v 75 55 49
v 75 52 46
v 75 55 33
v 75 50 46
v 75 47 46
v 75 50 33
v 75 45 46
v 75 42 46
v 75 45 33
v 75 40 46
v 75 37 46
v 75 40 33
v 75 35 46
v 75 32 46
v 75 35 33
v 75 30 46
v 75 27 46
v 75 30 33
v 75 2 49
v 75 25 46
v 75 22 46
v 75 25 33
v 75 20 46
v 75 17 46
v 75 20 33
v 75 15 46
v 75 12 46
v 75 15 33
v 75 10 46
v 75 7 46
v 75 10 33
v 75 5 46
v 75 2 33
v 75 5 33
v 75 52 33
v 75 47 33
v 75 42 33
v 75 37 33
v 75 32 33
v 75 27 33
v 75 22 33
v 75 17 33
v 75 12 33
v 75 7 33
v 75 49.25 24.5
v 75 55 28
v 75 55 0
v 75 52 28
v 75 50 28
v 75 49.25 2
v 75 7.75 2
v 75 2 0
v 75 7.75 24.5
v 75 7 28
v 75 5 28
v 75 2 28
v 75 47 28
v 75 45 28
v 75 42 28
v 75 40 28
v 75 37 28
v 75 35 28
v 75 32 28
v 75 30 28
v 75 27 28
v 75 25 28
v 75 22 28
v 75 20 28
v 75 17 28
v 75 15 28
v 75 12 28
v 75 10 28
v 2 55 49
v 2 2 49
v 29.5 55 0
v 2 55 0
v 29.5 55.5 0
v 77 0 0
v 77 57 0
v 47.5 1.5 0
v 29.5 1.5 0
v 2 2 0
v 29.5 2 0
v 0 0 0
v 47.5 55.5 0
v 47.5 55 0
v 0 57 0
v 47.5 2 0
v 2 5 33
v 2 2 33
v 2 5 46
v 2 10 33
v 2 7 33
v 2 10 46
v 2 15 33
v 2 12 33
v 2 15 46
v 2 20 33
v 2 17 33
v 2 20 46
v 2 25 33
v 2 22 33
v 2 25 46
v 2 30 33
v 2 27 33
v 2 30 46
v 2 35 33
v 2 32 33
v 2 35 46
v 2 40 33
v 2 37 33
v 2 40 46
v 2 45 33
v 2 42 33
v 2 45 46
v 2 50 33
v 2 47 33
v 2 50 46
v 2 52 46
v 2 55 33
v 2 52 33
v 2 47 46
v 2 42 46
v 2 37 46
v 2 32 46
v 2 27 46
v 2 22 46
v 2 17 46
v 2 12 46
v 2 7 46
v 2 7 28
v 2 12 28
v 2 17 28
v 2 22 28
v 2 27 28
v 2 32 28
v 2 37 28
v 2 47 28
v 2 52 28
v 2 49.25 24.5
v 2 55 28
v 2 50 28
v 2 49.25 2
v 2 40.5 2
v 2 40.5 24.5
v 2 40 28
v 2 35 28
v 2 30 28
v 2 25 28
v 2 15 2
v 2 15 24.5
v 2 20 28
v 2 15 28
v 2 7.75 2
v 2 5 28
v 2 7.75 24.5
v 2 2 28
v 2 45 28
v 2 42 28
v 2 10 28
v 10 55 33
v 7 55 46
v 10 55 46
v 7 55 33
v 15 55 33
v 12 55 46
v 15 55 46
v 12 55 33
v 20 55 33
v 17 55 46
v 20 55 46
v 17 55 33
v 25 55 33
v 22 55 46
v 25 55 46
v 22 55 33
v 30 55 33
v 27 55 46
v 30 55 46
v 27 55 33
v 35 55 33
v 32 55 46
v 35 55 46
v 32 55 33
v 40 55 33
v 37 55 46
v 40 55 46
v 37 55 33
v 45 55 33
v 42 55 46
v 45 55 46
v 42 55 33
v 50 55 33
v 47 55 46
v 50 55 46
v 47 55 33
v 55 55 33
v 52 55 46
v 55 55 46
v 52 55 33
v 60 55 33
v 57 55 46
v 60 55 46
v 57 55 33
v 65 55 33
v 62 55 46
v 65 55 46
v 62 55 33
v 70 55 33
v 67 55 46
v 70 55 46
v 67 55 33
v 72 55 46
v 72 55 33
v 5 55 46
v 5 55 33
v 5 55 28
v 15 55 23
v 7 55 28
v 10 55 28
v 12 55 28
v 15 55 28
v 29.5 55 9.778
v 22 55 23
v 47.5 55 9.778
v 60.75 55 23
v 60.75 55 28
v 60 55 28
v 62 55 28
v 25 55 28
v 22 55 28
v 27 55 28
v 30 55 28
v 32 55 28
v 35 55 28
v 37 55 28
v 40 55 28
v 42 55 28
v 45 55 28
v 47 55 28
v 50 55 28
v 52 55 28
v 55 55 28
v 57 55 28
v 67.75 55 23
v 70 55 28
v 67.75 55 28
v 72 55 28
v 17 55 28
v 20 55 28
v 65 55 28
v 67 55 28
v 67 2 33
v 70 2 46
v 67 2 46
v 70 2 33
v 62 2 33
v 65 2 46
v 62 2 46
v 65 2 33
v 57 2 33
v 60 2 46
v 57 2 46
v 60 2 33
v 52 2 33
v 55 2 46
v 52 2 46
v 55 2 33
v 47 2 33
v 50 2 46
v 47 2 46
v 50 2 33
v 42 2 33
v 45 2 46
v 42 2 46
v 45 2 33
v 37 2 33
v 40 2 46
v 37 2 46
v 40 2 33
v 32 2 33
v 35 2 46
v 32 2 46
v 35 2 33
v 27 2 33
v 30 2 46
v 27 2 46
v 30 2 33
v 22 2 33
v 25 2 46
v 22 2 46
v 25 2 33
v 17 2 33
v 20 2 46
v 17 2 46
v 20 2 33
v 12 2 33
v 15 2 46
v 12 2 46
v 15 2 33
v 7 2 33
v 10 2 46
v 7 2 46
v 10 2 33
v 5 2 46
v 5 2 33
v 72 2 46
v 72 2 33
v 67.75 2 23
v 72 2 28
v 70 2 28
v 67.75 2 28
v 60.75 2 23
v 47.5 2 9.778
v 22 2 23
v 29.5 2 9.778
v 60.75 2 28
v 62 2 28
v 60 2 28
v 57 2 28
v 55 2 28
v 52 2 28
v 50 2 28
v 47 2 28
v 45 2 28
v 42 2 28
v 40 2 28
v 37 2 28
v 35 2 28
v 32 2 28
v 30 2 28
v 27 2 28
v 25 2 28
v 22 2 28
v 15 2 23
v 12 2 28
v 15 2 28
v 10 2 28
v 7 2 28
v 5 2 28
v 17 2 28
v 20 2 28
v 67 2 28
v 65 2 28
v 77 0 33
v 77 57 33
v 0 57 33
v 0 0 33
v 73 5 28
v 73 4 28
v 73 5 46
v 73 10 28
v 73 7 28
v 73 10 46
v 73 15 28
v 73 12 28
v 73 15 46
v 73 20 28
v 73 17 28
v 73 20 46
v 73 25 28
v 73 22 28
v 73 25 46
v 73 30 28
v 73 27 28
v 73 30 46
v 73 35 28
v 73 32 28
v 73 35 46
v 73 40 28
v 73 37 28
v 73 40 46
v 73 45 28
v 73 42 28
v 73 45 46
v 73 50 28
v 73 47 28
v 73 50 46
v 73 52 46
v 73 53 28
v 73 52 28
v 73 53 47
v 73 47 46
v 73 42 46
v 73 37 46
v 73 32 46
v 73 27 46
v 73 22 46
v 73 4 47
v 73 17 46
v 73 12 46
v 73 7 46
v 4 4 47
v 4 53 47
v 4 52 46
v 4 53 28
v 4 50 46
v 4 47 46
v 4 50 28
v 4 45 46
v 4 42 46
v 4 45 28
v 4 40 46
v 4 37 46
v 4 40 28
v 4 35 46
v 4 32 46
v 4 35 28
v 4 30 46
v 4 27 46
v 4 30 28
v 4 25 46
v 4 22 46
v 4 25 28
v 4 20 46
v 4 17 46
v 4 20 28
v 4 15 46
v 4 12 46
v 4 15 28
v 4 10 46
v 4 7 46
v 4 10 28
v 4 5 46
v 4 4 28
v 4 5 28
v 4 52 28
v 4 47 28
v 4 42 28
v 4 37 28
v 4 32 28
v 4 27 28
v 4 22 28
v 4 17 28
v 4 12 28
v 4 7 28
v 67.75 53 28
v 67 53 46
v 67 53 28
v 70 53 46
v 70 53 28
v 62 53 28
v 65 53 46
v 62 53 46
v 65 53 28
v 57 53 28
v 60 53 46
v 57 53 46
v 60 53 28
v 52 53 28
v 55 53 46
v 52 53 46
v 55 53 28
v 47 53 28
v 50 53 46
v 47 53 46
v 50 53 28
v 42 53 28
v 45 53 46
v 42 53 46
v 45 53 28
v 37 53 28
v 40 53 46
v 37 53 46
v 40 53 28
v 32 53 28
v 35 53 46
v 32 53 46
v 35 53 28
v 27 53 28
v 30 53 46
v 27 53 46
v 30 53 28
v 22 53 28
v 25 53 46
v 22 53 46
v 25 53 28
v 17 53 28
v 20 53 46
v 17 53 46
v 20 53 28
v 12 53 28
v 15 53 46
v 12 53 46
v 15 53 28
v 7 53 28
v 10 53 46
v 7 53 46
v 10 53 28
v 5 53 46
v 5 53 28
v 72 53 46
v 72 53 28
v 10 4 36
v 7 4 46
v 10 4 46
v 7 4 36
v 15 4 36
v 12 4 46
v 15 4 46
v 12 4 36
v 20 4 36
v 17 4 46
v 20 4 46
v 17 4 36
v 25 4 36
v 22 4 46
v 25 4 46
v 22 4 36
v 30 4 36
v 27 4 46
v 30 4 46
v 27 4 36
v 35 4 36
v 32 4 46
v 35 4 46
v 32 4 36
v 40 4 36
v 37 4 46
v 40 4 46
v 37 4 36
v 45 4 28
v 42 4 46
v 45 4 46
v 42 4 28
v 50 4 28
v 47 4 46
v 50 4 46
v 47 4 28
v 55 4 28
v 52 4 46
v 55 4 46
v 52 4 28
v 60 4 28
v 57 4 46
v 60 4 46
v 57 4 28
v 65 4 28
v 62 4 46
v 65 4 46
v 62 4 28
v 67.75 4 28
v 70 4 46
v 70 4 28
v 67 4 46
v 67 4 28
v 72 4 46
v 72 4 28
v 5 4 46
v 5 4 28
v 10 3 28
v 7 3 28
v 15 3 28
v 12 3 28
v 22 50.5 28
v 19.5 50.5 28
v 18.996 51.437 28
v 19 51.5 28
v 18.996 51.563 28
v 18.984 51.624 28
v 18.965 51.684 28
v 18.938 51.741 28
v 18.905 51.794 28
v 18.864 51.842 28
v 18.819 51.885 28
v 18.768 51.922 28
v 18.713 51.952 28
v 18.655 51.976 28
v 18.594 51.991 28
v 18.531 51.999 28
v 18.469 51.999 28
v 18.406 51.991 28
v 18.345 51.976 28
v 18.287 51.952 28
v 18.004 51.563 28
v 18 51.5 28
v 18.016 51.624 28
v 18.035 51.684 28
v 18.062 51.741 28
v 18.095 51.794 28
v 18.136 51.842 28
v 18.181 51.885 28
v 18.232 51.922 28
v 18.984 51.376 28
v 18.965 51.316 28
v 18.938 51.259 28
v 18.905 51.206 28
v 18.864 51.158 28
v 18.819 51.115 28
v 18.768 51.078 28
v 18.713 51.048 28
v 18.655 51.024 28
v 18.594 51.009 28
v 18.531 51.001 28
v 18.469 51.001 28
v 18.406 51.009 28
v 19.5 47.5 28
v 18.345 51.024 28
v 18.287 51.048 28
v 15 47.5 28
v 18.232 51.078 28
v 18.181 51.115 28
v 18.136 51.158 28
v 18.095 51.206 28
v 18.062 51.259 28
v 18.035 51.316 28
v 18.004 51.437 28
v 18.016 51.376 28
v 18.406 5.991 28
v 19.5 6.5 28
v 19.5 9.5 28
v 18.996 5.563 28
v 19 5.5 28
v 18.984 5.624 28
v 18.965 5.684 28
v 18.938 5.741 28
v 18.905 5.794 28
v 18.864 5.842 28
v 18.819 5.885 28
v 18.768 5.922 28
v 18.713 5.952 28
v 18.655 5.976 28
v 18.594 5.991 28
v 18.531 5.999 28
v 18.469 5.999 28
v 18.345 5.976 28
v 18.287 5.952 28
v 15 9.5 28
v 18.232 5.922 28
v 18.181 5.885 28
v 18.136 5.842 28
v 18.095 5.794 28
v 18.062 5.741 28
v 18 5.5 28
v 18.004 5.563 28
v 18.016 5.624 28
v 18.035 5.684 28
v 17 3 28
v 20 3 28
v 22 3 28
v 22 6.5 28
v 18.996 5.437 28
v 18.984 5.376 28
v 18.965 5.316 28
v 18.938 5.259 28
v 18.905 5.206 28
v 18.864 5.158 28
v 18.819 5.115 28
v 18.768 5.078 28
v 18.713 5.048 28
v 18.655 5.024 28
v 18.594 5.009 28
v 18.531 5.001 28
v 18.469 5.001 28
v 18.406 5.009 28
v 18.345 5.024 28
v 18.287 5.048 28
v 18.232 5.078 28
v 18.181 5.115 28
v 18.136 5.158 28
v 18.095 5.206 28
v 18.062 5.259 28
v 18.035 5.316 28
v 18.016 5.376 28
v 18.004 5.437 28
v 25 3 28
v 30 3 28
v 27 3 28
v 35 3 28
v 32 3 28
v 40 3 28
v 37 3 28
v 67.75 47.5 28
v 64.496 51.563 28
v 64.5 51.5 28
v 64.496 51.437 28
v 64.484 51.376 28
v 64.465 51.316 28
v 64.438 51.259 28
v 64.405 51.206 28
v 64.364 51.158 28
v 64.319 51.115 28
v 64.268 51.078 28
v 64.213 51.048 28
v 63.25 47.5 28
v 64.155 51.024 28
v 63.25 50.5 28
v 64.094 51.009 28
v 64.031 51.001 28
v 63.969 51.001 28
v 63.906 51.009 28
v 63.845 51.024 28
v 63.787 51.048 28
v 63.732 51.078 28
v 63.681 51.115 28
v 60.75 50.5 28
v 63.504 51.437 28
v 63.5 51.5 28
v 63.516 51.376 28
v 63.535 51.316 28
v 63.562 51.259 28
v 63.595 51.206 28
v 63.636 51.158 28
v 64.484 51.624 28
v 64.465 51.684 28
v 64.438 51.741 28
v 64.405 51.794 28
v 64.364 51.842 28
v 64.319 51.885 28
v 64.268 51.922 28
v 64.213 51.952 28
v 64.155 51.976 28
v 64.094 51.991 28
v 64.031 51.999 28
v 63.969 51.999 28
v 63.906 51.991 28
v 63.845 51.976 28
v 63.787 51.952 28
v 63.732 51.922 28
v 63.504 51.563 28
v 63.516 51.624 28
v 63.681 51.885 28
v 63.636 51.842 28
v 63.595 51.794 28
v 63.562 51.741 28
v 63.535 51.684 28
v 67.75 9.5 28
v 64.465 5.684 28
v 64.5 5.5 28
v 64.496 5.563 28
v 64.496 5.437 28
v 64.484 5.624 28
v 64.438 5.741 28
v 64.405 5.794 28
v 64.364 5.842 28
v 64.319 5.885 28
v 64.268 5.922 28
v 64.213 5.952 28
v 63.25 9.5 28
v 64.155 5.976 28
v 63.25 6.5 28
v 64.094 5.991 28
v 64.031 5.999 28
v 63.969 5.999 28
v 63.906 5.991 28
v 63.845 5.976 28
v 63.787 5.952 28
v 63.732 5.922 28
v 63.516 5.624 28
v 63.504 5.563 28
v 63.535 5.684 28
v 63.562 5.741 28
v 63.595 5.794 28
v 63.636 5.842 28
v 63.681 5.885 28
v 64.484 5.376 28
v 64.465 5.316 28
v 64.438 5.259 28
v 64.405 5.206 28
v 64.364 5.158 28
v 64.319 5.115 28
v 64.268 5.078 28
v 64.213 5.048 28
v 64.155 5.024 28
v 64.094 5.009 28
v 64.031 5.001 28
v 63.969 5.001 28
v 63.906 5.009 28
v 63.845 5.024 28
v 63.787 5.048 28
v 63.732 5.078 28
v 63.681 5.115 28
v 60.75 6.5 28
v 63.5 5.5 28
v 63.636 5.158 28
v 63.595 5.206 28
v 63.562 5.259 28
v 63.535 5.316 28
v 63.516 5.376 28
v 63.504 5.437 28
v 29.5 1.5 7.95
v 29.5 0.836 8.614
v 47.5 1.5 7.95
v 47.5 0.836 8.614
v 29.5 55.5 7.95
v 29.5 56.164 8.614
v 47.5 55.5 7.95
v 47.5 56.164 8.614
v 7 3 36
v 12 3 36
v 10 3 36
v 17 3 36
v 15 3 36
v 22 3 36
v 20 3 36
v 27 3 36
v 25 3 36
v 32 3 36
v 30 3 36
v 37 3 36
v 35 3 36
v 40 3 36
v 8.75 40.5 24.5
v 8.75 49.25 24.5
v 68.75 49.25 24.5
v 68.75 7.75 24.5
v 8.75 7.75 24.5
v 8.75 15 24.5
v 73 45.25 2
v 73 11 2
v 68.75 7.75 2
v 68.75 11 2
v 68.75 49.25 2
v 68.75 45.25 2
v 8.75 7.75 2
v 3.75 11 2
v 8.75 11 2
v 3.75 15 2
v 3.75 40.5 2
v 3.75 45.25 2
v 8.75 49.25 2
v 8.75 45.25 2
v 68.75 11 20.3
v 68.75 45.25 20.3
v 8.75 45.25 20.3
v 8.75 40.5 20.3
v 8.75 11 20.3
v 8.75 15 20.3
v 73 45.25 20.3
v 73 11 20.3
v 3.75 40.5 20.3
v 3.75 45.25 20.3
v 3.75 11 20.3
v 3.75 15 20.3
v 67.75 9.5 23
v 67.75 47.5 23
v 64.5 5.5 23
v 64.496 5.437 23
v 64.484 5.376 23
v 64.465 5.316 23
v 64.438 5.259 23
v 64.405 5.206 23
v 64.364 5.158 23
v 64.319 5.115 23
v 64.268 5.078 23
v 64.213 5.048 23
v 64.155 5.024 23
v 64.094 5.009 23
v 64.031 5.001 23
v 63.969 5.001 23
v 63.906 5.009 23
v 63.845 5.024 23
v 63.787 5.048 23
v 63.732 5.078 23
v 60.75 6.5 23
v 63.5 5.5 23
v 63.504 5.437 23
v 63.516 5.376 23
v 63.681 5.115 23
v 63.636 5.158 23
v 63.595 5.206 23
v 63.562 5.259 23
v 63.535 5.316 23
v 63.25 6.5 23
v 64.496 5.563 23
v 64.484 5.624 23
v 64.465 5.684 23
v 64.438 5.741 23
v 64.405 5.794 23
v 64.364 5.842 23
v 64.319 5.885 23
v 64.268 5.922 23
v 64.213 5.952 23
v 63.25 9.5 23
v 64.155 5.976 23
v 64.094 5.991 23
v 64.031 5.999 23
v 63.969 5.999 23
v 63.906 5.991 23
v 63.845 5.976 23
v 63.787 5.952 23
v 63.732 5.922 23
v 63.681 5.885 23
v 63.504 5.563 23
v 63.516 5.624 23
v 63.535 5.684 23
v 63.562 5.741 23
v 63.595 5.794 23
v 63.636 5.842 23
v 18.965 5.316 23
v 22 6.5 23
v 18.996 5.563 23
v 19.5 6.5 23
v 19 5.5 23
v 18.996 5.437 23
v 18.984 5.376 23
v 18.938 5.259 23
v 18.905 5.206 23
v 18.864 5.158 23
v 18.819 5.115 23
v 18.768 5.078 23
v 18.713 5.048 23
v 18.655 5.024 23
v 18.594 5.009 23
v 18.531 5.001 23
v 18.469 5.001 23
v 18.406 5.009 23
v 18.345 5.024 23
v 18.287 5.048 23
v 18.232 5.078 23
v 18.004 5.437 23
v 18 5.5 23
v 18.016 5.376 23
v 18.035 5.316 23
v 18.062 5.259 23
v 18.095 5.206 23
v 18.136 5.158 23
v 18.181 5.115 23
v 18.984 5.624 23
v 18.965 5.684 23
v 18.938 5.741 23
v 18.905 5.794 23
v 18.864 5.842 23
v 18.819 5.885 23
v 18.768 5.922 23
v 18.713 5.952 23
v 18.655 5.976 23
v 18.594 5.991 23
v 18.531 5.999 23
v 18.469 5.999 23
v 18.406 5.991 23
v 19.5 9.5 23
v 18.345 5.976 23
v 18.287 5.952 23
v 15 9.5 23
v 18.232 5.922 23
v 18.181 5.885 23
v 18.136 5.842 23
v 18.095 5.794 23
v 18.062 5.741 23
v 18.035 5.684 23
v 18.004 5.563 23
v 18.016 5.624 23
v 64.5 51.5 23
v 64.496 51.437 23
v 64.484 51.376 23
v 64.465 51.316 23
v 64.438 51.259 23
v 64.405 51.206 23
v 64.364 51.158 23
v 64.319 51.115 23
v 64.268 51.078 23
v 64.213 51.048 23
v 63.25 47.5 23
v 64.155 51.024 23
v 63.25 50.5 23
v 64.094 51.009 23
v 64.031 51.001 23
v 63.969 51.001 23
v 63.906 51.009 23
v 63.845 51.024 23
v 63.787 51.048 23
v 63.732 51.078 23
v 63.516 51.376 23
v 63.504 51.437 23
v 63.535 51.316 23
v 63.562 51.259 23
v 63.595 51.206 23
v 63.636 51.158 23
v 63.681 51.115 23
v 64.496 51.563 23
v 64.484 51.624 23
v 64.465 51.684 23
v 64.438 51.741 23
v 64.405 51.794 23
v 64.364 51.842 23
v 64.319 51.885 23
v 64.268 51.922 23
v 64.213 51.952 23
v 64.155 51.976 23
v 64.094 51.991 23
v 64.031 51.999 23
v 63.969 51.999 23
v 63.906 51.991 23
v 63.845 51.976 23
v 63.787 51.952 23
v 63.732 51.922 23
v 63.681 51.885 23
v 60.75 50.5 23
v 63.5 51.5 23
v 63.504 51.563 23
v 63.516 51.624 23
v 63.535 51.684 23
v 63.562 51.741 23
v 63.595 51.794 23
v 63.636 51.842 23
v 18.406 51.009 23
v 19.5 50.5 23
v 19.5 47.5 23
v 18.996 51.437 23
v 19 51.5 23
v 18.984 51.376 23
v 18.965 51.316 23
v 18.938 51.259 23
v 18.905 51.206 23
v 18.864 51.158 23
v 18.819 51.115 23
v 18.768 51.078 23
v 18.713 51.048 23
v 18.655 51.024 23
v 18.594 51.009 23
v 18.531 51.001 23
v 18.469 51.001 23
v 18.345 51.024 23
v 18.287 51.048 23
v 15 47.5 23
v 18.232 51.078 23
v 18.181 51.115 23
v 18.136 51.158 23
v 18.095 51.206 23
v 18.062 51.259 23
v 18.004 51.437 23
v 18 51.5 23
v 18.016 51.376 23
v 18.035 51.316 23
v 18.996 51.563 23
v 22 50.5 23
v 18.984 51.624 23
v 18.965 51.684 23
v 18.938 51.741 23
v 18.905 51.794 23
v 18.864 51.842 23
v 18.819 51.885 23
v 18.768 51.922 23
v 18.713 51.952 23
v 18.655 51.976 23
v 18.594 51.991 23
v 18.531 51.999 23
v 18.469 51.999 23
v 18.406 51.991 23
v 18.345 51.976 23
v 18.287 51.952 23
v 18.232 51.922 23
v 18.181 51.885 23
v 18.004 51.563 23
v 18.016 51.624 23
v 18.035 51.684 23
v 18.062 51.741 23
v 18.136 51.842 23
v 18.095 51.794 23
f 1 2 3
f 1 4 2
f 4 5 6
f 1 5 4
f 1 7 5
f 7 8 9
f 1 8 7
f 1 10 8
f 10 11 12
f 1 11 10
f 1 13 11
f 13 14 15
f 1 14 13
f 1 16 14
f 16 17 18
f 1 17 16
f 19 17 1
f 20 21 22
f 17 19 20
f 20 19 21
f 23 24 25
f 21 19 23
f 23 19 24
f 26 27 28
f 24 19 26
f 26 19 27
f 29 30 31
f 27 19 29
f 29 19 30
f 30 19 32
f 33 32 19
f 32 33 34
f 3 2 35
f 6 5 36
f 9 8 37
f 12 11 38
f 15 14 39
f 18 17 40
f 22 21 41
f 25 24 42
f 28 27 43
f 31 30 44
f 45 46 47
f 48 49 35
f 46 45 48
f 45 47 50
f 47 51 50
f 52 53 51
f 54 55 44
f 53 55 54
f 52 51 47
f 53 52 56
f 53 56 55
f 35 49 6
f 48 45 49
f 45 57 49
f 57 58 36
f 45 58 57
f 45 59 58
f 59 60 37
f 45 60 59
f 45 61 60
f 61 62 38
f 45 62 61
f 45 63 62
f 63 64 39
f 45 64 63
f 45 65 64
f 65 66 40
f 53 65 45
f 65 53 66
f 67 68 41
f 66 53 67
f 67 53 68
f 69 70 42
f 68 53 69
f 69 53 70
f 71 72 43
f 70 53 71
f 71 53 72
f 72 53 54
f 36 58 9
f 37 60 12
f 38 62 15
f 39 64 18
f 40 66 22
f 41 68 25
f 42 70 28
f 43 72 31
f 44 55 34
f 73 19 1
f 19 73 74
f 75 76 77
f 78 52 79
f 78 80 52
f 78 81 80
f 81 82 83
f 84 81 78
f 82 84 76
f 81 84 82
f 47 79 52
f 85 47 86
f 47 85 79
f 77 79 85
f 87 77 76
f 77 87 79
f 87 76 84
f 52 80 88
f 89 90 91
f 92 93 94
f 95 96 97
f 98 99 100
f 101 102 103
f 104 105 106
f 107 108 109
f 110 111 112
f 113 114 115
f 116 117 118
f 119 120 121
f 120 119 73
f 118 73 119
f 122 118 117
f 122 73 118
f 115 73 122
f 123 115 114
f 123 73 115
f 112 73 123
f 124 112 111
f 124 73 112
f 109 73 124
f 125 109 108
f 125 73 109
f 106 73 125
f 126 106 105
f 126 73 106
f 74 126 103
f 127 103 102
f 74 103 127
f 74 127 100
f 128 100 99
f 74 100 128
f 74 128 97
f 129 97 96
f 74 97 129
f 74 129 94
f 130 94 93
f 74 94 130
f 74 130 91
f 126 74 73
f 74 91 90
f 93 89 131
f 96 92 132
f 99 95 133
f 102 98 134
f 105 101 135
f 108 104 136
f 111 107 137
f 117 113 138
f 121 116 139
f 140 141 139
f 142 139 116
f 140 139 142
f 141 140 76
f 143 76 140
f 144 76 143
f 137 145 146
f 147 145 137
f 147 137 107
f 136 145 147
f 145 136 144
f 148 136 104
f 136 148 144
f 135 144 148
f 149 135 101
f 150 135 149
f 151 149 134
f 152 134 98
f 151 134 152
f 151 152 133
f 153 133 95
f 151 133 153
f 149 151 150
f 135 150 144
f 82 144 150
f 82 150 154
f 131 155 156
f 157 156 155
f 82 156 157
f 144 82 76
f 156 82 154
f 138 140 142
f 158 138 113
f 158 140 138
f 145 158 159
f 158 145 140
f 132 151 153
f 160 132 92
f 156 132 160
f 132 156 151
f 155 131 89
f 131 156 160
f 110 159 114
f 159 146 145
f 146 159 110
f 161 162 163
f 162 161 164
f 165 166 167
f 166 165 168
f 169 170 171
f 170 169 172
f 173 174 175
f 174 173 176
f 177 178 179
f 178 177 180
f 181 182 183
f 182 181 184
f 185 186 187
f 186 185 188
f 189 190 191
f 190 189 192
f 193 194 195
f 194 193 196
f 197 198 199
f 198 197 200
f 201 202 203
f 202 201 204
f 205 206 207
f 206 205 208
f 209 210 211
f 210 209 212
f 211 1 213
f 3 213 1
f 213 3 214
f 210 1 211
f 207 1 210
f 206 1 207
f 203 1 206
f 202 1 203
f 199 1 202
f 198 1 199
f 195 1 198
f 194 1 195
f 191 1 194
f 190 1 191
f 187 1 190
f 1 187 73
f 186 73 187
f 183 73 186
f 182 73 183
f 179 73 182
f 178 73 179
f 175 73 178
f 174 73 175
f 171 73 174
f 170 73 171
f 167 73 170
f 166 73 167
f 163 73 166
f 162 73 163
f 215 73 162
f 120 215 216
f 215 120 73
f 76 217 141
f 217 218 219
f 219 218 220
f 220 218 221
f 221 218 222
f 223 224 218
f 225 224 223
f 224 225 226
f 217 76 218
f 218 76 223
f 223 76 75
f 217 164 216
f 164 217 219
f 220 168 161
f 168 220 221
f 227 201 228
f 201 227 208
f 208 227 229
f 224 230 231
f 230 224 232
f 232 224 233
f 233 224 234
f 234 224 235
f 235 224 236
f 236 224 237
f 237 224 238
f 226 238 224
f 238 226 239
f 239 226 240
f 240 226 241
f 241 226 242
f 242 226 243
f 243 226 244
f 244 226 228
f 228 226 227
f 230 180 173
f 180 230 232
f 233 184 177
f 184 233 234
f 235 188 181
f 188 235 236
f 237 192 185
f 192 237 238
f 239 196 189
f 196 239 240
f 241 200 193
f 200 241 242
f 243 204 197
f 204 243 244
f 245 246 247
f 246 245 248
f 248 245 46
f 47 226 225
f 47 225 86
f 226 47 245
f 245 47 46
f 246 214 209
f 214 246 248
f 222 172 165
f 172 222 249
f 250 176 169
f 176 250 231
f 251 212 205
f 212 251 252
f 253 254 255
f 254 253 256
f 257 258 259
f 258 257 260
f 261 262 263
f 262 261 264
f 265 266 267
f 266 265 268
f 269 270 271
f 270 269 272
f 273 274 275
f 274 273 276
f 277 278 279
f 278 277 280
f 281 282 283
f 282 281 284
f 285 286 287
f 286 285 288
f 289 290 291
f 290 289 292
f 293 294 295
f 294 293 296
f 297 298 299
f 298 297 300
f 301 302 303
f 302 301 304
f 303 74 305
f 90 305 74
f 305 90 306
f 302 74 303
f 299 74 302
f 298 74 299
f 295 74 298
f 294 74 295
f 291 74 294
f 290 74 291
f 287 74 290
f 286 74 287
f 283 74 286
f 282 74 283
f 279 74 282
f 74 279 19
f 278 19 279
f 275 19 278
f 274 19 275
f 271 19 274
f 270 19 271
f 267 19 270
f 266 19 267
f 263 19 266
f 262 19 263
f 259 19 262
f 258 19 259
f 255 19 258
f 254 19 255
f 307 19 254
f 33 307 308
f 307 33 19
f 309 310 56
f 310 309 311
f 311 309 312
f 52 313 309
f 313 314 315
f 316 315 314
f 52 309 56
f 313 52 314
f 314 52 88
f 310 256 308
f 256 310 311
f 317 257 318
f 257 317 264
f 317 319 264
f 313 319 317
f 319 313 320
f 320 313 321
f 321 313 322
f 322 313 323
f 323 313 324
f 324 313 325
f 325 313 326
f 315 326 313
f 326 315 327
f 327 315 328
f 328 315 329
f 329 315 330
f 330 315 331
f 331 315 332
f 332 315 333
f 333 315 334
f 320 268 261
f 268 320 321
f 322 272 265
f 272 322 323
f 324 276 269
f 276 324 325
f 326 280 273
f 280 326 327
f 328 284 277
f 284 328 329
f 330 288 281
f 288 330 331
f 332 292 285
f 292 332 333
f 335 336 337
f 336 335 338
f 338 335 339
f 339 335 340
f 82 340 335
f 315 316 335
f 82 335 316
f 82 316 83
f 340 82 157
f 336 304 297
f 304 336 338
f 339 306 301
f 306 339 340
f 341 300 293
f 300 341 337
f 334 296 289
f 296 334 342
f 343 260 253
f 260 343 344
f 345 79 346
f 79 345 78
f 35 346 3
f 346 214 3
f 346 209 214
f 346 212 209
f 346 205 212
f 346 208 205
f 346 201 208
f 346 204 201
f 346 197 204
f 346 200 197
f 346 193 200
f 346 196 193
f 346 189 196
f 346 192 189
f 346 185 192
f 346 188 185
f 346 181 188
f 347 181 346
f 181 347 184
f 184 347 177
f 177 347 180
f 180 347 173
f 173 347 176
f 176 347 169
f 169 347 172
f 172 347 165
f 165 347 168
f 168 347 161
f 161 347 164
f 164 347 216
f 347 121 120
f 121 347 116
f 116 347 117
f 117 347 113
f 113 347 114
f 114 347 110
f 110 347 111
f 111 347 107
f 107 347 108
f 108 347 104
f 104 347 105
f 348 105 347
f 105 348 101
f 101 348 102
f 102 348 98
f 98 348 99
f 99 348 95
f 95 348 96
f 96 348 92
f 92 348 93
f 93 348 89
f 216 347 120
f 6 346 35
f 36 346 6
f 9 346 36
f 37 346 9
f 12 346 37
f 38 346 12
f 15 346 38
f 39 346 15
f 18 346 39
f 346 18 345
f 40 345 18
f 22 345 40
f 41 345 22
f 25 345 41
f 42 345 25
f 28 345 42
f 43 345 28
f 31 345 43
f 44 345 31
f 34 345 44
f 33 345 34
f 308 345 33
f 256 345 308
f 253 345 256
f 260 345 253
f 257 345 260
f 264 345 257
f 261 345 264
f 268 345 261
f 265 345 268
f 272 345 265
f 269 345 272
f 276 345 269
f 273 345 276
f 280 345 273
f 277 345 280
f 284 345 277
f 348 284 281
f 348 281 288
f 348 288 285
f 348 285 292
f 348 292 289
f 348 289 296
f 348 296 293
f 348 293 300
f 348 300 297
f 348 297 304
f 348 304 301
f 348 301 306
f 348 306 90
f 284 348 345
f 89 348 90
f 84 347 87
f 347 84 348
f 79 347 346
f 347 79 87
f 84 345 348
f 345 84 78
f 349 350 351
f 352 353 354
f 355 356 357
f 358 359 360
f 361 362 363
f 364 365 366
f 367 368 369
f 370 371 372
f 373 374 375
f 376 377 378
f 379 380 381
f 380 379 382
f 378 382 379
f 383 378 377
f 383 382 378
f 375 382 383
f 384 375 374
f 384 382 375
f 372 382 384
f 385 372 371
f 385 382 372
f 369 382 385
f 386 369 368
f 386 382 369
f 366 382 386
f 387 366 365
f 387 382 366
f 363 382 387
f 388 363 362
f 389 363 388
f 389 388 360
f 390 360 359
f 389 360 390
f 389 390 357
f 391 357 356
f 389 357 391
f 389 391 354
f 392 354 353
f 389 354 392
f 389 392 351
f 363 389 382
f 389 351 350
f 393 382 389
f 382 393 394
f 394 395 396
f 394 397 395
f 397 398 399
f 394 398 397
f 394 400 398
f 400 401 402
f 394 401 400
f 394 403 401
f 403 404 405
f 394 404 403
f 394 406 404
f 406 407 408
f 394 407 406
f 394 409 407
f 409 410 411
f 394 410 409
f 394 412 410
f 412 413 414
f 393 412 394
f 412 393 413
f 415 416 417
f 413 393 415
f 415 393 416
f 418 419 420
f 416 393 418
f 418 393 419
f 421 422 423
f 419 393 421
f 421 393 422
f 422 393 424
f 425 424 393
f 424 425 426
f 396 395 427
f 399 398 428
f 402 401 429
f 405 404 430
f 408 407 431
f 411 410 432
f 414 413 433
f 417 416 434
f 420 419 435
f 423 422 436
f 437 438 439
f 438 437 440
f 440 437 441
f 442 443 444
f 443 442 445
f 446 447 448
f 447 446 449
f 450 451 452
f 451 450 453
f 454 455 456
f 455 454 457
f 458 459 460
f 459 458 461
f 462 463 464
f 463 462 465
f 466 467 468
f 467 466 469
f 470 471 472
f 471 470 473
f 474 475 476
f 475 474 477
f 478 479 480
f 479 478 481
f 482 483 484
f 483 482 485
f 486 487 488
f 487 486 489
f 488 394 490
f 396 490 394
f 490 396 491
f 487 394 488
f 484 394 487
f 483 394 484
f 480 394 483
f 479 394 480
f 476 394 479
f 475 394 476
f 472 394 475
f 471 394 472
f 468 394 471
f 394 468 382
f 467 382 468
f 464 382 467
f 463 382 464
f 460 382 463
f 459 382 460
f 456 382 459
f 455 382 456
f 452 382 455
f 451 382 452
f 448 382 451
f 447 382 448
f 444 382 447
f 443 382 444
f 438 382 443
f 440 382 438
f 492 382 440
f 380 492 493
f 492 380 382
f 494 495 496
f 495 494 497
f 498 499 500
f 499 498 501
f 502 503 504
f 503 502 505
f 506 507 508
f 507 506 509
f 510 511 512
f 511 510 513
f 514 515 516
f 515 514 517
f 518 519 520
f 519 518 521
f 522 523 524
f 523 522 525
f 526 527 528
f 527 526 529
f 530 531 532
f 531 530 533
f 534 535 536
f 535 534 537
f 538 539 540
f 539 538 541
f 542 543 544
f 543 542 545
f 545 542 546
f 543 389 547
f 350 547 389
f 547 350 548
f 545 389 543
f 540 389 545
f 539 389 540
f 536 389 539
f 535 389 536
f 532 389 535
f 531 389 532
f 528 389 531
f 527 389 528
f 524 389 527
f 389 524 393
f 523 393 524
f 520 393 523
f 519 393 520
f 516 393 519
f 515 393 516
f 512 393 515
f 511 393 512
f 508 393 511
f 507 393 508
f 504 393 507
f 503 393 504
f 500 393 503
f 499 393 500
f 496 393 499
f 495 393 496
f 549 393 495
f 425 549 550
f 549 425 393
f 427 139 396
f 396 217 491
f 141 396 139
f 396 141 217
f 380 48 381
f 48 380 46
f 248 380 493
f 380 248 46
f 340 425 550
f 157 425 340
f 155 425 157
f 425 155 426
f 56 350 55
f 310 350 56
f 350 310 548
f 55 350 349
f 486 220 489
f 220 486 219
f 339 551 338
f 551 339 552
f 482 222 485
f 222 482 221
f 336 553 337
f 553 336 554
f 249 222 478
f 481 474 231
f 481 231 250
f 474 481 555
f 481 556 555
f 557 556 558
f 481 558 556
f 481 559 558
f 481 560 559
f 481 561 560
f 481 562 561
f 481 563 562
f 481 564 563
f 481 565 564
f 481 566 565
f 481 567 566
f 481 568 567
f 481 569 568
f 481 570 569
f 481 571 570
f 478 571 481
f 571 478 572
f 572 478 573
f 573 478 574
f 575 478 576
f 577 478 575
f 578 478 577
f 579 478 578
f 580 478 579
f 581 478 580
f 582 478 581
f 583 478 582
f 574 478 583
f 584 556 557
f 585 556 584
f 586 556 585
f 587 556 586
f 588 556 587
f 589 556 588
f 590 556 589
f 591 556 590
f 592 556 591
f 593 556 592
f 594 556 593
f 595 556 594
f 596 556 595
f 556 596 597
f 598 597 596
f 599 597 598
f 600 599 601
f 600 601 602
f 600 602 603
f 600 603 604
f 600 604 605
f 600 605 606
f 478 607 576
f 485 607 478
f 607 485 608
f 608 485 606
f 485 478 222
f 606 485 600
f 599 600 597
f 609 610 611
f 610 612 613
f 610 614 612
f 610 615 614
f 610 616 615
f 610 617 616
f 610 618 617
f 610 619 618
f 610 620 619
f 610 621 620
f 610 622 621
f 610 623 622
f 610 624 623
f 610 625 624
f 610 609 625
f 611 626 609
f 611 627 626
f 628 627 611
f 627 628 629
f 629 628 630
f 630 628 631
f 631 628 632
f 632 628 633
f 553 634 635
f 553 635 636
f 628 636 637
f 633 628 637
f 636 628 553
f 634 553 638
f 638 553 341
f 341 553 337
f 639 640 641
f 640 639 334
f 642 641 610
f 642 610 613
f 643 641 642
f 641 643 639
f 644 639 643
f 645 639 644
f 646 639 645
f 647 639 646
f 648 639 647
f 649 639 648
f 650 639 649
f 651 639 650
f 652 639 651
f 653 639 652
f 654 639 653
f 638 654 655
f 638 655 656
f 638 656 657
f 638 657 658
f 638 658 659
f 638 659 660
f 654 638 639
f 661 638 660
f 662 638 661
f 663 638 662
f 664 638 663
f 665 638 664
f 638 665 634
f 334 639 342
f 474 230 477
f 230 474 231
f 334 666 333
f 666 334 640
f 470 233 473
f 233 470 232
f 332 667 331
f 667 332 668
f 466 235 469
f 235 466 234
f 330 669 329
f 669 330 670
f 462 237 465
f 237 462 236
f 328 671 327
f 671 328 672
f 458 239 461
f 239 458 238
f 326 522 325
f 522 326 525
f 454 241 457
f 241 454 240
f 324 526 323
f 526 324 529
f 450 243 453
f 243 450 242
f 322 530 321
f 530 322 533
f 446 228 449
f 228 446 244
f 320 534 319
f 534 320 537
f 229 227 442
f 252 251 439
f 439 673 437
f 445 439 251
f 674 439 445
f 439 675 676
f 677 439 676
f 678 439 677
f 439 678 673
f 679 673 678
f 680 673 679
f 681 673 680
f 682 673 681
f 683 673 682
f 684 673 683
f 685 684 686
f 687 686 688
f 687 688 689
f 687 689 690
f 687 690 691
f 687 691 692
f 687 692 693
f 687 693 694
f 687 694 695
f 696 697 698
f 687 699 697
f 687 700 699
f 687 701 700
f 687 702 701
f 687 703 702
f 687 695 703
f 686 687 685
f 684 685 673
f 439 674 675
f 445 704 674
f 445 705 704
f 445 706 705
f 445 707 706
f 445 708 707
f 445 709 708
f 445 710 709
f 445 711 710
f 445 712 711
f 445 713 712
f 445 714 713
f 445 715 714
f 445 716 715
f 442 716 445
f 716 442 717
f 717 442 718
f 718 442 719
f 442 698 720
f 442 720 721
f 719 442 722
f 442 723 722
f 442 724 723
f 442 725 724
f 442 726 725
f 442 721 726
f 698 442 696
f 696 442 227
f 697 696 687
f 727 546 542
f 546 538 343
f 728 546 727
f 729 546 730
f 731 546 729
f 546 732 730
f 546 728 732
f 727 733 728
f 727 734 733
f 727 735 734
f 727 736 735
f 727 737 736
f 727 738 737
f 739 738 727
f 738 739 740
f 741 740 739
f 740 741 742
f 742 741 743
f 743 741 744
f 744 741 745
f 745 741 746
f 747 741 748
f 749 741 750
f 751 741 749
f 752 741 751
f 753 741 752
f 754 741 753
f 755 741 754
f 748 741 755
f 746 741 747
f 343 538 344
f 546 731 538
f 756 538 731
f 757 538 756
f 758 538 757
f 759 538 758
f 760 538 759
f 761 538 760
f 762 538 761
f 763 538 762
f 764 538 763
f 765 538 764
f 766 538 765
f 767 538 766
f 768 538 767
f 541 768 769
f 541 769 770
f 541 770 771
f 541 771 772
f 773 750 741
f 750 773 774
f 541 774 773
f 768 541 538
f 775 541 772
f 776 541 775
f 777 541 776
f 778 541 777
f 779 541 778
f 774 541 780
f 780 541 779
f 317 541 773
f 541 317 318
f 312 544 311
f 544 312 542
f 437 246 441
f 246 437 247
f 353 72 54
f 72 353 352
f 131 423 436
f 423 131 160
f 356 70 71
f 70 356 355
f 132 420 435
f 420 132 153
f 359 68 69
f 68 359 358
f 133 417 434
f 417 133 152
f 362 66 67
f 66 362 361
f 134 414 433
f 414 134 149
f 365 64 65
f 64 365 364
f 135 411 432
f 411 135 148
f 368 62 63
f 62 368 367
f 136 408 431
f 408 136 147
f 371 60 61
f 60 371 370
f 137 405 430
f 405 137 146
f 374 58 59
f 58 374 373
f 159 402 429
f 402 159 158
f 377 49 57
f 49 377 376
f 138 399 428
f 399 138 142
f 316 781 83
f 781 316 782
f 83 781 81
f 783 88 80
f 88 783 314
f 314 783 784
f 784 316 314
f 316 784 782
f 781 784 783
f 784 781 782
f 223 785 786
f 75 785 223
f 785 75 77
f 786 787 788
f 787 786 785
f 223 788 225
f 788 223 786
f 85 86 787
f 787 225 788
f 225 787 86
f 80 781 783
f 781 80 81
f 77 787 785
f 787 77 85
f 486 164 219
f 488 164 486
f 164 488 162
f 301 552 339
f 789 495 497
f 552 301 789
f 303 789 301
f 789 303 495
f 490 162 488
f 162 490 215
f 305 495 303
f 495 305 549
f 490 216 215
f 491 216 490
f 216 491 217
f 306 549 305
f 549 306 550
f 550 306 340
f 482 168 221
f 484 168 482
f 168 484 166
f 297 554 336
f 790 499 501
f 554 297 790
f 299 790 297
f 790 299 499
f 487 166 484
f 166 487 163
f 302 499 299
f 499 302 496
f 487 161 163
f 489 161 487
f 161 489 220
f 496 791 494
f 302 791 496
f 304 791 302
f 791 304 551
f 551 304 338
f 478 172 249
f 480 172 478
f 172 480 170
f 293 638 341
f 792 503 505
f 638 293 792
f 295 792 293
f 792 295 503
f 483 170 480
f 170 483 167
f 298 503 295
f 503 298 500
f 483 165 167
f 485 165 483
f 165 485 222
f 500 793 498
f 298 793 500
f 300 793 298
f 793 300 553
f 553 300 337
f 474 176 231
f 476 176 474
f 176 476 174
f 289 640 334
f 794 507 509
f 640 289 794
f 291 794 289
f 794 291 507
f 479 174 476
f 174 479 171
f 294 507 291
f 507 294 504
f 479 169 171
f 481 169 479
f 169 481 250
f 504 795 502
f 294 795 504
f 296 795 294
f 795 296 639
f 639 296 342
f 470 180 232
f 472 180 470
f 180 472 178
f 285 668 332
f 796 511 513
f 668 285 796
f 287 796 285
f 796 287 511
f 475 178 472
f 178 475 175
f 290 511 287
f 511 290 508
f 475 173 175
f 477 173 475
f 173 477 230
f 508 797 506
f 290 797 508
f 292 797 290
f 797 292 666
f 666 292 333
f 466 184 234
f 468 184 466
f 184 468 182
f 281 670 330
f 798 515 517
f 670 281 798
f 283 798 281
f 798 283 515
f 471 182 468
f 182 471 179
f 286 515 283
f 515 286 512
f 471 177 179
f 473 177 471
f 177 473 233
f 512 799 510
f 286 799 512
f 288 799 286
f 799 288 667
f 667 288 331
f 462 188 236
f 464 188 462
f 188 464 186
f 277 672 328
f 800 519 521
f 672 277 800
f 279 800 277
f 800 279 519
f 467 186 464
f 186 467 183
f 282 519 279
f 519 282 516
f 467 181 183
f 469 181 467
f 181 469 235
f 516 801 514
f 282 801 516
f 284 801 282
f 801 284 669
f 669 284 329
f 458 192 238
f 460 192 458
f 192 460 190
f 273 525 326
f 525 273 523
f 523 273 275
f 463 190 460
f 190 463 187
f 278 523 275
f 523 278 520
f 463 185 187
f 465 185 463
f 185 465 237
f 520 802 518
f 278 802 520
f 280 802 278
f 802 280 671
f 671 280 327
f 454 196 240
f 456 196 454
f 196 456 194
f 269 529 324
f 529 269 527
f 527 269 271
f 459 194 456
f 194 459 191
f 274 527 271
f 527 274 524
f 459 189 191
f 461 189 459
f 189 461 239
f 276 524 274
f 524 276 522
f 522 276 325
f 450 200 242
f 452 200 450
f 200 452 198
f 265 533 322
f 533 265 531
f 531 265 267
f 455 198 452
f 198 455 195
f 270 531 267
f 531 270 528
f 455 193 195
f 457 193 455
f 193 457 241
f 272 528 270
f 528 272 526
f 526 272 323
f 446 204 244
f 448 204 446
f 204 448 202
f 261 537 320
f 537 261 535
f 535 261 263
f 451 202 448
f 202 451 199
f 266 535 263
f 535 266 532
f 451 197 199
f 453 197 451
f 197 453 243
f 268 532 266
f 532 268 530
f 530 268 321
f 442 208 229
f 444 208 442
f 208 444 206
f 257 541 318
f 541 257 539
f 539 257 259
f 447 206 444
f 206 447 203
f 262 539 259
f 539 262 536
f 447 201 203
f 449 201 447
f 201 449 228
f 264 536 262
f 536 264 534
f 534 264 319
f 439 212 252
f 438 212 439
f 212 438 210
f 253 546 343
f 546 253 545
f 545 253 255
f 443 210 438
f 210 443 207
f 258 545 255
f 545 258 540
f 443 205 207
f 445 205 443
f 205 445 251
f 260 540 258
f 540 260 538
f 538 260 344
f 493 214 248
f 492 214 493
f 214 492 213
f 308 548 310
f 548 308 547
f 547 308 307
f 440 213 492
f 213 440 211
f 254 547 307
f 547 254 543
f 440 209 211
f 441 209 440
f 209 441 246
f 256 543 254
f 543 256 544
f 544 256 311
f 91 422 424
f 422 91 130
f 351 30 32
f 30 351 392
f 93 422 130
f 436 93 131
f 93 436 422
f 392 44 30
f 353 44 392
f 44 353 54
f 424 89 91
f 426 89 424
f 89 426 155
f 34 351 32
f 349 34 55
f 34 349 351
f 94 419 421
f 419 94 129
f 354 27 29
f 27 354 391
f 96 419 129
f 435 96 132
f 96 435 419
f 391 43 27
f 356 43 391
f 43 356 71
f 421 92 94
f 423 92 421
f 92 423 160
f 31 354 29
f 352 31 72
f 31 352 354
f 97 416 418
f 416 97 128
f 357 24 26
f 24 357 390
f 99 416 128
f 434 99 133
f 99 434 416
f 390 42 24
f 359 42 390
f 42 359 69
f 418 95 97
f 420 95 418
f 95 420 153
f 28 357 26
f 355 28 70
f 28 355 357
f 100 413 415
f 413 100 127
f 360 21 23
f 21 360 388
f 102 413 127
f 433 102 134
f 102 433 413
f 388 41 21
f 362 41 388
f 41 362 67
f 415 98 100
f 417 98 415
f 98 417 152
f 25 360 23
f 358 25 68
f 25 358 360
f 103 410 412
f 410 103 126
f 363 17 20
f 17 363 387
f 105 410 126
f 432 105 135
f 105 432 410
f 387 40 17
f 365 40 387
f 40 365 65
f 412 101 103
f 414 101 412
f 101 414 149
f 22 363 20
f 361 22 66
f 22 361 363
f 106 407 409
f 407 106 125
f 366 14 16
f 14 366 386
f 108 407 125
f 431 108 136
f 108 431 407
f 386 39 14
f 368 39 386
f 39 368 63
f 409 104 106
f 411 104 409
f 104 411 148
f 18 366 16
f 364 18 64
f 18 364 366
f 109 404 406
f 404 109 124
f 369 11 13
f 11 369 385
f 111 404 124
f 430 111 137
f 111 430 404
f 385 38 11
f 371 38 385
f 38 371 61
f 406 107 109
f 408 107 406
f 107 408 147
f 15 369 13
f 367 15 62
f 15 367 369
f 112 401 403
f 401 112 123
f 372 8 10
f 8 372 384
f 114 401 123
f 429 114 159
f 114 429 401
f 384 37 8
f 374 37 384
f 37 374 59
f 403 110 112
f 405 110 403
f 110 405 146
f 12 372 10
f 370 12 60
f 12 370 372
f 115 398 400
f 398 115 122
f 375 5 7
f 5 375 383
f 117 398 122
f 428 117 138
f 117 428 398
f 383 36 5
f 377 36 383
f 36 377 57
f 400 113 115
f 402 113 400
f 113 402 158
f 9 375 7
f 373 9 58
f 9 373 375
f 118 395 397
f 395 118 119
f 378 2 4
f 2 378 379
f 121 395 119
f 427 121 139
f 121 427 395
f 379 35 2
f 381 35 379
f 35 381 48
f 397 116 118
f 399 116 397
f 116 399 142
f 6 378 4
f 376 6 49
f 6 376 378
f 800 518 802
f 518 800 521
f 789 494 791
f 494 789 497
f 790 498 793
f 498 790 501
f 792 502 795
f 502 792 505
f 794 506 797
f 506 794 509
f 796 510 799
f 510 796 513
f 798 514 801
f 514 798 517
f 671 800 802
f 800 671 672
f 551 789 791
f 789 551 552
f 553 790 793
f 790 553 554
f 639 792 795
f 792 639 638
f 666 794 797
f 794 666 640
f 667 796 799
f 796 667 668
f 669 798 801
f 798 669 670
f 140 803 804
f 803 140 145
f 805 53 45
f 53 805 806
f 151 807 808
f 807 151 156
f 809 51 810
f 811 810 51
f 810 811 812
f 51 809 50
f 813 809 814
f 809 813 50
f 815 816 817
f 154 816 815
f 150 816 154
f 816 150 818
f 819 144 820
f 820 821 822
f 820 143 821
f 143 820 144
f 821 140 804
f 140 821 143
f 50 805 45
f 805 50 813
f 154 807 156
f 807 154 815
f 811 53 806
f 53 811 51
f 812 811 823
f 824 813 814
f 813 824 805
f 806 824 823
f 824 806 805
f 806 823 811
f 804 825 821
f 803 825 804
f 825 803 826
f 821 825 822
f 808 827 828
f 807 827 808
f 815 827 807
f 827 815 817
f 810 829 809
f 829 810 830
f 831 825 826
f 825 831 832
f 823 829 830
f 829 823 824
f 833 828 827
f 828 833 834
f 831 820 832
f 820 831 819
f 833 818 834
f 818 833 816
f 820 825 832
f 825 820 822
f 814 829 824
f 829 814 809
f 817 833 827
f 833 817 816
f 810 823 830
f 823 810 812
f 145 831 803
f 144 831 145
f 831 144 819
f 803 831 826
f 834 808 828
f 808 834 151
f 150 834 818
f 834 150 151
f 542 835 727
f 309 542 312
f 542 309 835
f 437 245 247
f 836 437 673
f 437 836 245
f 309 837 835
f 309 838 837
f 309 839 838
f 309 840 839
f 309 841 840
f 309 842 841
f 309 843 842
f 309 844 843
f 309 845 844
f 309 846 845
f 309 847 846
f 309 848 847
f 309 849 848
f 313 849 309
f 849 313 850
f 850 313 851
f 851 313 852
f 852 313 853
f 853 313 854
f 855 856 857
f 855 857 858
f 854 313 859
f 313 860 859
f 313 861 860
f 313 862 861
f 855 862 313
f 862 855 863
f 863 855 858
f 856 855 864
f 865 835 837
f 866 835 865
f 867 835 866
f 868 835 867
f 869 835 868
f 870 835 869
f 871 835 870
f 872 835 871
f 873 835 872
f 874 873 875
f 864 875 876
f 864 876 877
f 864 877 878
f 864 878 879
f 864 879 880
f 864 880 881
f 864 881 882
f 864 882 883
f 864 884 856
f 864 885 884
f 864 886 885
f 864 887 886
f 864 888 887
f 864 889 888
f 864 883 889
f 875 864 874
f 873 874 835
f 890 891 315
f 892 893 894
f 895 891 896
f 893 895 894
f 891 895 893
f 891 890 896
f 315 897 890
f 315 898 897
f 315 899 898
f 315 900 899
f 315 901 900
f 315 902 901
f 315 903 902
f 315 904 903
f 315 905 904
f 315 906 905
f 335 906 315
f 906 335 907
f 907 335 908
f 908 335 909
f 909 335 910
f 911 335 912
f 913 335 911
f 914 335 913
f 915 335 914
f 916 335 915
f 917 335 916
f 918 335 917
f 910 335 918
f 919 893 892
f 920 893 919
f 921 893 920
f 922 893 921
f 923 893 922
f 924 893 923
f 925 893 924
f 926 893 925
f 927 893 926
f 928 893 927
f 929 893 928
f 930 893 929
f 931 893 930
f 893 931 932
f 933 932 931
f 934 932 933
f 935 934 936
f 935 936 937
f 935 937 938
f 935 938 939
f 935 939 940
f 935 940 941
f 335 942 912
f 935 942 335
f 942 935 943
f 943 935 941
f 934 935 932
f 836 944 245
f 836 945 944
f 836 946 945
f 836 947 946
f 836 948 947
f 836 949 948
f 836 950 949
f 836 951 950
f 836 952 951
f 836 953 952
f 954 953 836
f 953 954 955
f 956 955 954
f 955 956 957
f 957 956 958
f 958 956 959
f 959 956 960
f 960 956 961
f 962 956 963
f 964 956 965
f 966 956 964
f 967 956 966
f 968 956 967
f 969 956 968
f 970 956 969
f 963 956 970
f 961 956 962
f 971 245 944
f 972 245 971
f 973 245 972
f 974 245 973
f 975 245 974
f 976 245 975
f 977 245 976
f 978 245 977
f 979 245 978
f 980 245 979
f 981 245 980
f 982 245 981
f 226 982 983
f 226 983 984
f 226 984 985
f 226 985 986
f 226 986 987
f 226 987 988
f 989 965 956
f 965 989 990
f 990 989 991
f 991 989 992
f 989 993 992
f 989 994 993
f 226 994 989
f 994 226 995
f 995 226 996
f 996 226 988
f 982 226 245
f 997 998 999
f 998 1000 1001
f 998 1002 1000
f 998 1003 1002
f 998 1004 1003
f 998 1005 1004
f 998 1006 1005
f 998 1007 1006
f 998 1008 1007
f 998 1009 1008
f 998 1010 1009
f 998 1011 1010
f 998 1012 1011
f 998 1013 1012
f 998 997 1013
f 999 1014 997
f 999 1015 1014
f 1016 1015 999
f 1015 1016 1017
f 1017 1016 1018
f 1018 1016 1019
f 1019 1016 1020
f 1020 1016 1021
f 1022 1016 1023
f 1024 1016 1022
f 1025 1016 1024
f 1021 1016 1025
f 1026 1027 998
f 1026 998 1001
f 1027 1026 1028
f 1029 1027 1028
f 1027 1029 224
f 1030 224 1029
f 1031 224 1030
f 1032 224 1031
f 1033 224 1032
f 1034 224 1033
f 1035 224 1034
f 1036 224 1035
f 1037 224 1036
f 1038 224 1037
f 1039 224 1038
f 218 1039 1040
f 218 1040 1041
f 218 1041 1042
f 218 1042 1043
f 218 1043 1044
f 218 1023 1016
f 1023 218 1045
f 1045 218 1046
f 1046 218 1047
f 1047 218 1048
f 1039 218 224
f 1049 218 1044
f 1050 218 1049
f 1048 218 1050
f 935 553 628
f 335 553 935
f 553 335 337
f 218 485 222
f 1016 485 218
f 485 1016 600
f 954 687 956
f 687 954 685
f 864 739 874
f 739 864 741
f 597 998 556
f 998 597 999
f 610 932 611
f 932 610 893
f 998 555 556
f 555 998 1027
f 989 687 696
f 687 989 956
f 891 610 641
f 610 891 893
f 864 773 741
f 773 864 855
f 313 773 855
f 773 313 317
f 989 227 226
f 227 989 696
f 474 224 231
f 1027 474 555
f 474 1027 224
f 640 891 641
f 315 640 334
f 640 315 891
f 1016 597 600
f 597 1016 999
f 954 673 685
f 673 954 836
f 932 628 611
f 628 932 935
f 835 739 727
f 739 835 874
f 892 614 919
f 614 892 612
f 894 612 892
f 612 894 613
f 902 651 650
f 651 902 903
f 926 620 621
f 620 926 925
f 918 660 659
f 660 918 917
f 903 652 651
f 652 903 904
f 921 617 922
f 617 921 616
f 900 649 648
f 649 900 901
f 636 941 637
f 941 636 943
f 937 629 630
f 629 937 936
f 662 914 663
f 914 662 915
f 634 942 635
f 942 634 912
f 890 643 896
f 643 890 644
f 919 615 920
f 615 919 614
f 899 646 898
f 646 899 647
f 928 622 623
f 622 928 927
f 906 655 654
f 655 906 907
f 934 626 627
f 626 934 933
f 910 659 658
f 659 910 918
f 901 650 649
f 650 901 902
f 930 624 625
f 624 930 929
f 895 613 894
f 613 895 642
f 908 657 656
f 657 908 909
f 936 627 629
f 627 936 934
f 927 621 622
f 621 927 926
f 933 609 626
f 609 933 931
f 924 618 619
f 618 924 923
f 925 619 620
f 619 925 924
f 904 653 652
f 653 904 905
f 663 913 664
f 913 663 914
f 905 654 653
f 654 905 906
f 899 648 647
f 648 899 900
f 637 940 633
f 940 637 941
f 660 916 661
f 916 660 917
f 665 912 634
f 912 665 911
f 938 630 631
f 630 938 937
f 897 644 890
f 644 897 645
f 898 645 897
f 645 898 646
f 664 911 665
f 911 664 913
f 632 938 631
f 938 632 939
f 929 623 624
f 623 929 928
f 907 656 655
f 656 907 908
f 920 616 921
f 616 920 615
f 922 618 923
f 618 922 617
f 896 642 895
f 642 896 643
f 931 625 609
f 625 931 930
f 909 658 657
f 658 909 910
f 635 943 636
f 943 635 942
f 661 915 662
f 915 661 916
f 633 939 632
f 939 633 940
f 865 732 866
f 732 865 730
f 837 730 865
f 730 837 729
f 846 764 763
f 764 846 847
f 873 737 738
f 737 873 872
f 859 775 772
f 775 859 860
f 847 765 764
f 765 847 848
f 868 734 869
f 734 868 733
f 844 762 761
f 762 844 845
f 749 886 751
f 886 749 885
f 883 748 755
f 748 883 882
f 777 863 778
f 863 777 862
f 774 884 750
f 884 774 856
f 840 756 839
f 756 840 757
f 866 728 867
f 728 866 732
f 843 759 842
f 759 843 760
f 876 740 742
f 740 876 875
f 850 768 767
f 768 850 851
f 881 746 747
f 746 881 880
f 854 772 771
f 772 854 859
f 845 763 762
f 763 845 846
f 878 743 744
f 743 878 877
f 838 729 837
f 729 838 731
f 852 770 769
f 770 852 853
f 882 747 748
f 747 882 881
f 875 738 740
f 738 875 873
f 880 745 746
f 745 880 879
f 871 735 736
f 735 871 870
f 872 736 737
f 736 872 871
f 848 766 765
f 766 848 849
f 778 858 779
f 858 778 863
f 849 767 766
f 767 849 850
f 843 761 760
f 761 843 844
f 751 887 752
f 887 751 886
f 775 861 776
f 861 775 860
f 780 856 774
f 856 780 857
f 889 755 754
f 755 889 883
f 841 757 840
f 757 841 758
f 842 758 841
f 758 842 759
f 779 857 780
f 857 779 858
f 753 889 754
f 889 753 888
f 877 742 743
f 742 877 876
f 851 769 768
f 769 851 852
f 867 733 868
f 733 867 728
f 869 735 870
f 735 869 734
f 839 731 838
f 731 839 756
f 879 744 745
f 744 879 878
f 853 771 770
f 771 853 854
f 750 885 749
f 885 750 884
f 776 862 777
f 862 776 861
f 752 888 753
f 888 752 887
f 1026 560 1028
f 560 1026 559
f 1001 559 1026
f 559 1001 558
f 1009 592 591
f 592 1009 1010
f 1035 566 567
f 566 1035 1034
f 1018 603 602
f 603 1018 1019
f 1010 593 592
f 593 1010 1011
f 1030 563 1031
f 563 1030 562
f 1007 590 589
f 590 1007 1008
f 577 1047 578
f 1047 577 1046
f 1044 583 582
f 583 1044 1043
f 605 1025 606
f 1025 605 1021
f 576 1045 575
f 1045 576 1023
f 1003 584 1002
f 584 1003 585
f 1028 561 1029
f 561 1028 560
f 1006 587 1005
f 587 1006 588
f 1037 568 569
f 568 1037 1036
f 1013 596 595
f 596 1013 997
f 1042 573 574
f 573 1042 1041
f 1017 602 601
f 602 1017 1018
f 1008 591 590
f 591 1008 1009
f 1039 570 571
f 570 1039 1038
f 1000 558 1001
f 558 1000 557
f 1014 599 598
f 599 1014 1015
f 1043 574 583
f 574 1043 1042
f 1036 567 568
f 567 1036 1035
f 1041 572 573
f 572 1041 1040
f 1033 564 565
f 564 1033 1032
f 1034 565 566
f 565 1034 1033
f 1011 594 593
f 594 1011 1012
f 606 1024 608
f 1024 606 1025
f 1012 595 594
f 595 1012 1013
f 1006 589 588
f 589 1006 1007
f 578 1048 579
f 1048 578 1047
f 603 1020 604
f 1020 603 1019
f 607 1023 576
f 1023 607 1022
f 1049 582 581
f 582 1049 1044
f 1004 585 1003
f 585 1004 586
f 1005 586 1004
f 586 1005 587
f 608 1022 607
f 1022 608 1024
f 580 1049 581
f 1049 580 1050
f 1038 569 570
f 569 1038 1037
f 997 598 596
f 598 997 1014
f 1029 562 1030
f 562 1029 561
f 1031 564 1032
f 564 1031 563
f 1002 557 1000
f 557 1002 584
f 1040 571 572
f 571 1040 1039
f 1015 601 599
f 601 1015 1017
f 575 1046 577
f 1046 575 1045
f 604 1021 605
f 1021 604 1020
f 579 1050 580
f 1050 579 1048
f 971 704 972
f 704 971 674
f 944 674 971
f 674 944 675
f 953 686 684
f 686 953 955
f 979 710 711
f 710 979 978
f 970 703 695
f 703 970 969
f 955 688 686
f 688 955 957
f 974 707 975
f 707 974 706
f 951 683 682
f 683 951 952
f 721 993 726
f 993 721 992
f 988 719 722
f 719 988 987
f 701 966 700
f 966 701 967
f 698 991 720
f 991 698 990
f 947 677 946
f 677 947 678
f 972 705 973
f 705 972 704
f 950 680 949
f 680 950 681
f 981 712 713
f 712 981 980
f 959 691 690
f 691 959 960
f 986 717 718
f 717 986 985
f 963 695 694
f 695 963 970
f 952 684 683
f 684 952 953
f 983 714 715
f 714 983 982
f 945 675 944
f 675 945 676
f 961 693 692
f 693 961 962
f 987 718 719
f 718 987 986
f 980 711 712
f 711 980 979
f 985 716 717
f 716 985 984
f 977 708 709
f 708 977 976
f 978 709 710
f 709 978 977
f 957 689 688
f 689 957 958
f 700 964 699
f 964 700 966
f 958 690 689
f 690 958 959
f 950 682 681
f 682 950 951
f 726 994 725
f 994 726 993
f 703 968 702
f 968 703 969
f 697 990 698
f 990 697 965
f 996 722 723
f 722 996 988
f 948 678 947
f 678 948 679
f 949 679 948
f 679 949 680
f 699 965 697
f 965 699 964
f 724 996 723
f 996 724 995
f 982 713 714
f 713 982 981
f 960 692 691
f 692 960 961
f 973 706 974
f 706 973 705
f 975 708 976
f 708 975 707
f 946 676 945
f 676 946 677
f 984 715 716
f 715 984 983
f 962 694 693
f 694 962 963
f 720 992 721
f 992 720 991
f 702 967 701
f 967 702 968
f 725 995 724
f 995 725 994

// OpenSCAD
//Humidity sensor project box

$fn = 50;

/* Comment or uncomment the following lines to see each piece on its own
 * You can also add a translate() to one line to move the plate next to the
 * cover for viewing both.  I did it this way to export both as separate 
 * .stl files
 */
cover();
//wall_plate();

module wall_plate() {
    //Create the base platform with mounting holes
    difference() {
        union() {
            translate([0, 0, -1]) cube([77, 57, 1]);
            translate([2.25, 2.25, 0]) cube([72.5, 52.5, 2]);
        }
        translate([15, 28.5, -2]) cylinder(d=4, h=5);
        translate([62, 28.5, -2]) cylinder(d=4, h=5);
        
        translate([15, 28.5, 1]) cylinder(d=8, h=2);
        translate([62, 28.5, 1]) cylinder(d=8, h=2);
    }
    
    //Create the snap tab uprights
    difference() {
        translate([30.5, 2.25, 0]) cube([16, 52.5, 10]);
        
        translate([30.5, 5.25, 0]) cube([16, 46.5, 10]);
    }
    
    //Create the latches
    translate([30.5, 2.25, 7.2]) rotate([45, 0, 0]) cube([16, 2, 2]);
    translate([30.5, 54.75, 7.2]) rotate([45, 0, 0]) cube([16, 2, 2]);
}

module cover() {
    //Create the main vented box
    difference() {
        //Create the outer box layers
        union() {
            translate([2, 2, 0]) cube([73, 53, 49]);
            cube([77, 57, 33]);
        }
        //Hollow out the box
        translate([4, 4, 0]) cube([69, 49, 47]);
        translate([2, 2, 0]) cube([73, 53, 28]);
        
        //Create the latch reliefs
        translate([29.5, 2.25, 7.2]) rotate([45, 0, 0]) cube([18, 2, 2]);
        translate([29.5, 54.75, 7.2]) rotate([45, 0, 0]) cube([18, 2, 2]);
        
        translate([29.5, 1.5, 0]) cube([18, 2, 8.2]);
        translate([29.5, 53.5, 0]) cube([18, 2, 8.2]);
        
        //Add the horizontal vent slots to the top layer
        translate([5, 2, 28]) cube([2, 53, 18]);
        translate([10, 2, 28]) cube([2, 53, 18]);
        translate([15, 2, 28]) cube([2, 53, 18]);
        translate([20, 2, 28]) cube([2, 53, 18]);
        translate([25, 2, 28]) cube([2, 53, 18]);
        translate([30, 2, 28]) cube([2, 53, 18]);
        translate([35, 2, 28]) cube([2, 53, 18]);
        translate([40, 2, 28]) cube([2, 53, 18]);
        translate([45, 2, 28]) cube([2, 53, 18]);
        translate([50, 2, 28]) cube([2, 53, 18]);
        translate([55, 2, 28]) cube([2, 53, 18]);
        translate([60, 2, 28]) cube([2, 53, 18]);
        translate([65, 2, 28]) cube([2, 53, 18]);
        translate([70, 2, 28]) cube([2, 53, 18]);
        //Add the vertical vent slots to the top layer
        translate([2, 5, 28]) cube([73, 2, 18]);
        translate([2, 10, 28]) cube([73, 2, 18]);
        translate([2, 15, 28]) cube([73, 2, 18]);
        translate([2, 20, 28]) cube([73, 2, 18]);
        translate([2, 25, 28]) cube([73, 2, 18]);
        translate([2, 30, 28]) cube([73, 2, 18]);
        translate([2, 35, 28]) cube([73, 2, 18]);
        translate([2, 40, 28]) cube([73, 2, 18]);
        translate([2, 45, 28]) cube([73, 2, 18]);
        translate([2, 50, 28]) cube([73, 2, 18]);
        
        //This is a slight relief in the side vents where the radio module sits  
        //to prevent the radio from restin on the side of the vents.  This makes
        //screwing the PCB on easier.
        translate([5, 3, 26]) cube([35, 4, 10]);
    }

    //Create the battery case holder
    difference() {
        translate([2, 7.75, 2]) cube([73, 41.5, 22.5]);
        
        translate([8.75, 7.75, 2]) cube([60, 41.5, 22.5]);
        translate([3.75, 11, 2]) cube([69.25, 34.25, 18.3]);
        //Cut out a slot for the power wires
        translate([2, 15, 0]) cube([10, 25.5, 25]);
        
    }

    //Create the mounting tabs for the PCB
    difference() {    
        translate([15, 2, 23]) cube([52.75, 55, 5]);
        
        translate([19.5, 6.5, 23]) cube([43.75, 44, 5]);
        translate([22, 2, 23]) cube([38.75, 55, 5]);
        translate([14, 9.5, 23]) cube([54.75, 38, 5]);
        
        translate([18.5, 5.5, 23]) cylinder(d=1, h=5);
        translate([64, 5.5, 23]) cylinder(d=1, h=5);
        translate([18.5, 51.5, 23]) cylinder(d=1, h=5);
        translate([64, 51.5, 23]) cylinder(d=1, h=5);
    }
}
